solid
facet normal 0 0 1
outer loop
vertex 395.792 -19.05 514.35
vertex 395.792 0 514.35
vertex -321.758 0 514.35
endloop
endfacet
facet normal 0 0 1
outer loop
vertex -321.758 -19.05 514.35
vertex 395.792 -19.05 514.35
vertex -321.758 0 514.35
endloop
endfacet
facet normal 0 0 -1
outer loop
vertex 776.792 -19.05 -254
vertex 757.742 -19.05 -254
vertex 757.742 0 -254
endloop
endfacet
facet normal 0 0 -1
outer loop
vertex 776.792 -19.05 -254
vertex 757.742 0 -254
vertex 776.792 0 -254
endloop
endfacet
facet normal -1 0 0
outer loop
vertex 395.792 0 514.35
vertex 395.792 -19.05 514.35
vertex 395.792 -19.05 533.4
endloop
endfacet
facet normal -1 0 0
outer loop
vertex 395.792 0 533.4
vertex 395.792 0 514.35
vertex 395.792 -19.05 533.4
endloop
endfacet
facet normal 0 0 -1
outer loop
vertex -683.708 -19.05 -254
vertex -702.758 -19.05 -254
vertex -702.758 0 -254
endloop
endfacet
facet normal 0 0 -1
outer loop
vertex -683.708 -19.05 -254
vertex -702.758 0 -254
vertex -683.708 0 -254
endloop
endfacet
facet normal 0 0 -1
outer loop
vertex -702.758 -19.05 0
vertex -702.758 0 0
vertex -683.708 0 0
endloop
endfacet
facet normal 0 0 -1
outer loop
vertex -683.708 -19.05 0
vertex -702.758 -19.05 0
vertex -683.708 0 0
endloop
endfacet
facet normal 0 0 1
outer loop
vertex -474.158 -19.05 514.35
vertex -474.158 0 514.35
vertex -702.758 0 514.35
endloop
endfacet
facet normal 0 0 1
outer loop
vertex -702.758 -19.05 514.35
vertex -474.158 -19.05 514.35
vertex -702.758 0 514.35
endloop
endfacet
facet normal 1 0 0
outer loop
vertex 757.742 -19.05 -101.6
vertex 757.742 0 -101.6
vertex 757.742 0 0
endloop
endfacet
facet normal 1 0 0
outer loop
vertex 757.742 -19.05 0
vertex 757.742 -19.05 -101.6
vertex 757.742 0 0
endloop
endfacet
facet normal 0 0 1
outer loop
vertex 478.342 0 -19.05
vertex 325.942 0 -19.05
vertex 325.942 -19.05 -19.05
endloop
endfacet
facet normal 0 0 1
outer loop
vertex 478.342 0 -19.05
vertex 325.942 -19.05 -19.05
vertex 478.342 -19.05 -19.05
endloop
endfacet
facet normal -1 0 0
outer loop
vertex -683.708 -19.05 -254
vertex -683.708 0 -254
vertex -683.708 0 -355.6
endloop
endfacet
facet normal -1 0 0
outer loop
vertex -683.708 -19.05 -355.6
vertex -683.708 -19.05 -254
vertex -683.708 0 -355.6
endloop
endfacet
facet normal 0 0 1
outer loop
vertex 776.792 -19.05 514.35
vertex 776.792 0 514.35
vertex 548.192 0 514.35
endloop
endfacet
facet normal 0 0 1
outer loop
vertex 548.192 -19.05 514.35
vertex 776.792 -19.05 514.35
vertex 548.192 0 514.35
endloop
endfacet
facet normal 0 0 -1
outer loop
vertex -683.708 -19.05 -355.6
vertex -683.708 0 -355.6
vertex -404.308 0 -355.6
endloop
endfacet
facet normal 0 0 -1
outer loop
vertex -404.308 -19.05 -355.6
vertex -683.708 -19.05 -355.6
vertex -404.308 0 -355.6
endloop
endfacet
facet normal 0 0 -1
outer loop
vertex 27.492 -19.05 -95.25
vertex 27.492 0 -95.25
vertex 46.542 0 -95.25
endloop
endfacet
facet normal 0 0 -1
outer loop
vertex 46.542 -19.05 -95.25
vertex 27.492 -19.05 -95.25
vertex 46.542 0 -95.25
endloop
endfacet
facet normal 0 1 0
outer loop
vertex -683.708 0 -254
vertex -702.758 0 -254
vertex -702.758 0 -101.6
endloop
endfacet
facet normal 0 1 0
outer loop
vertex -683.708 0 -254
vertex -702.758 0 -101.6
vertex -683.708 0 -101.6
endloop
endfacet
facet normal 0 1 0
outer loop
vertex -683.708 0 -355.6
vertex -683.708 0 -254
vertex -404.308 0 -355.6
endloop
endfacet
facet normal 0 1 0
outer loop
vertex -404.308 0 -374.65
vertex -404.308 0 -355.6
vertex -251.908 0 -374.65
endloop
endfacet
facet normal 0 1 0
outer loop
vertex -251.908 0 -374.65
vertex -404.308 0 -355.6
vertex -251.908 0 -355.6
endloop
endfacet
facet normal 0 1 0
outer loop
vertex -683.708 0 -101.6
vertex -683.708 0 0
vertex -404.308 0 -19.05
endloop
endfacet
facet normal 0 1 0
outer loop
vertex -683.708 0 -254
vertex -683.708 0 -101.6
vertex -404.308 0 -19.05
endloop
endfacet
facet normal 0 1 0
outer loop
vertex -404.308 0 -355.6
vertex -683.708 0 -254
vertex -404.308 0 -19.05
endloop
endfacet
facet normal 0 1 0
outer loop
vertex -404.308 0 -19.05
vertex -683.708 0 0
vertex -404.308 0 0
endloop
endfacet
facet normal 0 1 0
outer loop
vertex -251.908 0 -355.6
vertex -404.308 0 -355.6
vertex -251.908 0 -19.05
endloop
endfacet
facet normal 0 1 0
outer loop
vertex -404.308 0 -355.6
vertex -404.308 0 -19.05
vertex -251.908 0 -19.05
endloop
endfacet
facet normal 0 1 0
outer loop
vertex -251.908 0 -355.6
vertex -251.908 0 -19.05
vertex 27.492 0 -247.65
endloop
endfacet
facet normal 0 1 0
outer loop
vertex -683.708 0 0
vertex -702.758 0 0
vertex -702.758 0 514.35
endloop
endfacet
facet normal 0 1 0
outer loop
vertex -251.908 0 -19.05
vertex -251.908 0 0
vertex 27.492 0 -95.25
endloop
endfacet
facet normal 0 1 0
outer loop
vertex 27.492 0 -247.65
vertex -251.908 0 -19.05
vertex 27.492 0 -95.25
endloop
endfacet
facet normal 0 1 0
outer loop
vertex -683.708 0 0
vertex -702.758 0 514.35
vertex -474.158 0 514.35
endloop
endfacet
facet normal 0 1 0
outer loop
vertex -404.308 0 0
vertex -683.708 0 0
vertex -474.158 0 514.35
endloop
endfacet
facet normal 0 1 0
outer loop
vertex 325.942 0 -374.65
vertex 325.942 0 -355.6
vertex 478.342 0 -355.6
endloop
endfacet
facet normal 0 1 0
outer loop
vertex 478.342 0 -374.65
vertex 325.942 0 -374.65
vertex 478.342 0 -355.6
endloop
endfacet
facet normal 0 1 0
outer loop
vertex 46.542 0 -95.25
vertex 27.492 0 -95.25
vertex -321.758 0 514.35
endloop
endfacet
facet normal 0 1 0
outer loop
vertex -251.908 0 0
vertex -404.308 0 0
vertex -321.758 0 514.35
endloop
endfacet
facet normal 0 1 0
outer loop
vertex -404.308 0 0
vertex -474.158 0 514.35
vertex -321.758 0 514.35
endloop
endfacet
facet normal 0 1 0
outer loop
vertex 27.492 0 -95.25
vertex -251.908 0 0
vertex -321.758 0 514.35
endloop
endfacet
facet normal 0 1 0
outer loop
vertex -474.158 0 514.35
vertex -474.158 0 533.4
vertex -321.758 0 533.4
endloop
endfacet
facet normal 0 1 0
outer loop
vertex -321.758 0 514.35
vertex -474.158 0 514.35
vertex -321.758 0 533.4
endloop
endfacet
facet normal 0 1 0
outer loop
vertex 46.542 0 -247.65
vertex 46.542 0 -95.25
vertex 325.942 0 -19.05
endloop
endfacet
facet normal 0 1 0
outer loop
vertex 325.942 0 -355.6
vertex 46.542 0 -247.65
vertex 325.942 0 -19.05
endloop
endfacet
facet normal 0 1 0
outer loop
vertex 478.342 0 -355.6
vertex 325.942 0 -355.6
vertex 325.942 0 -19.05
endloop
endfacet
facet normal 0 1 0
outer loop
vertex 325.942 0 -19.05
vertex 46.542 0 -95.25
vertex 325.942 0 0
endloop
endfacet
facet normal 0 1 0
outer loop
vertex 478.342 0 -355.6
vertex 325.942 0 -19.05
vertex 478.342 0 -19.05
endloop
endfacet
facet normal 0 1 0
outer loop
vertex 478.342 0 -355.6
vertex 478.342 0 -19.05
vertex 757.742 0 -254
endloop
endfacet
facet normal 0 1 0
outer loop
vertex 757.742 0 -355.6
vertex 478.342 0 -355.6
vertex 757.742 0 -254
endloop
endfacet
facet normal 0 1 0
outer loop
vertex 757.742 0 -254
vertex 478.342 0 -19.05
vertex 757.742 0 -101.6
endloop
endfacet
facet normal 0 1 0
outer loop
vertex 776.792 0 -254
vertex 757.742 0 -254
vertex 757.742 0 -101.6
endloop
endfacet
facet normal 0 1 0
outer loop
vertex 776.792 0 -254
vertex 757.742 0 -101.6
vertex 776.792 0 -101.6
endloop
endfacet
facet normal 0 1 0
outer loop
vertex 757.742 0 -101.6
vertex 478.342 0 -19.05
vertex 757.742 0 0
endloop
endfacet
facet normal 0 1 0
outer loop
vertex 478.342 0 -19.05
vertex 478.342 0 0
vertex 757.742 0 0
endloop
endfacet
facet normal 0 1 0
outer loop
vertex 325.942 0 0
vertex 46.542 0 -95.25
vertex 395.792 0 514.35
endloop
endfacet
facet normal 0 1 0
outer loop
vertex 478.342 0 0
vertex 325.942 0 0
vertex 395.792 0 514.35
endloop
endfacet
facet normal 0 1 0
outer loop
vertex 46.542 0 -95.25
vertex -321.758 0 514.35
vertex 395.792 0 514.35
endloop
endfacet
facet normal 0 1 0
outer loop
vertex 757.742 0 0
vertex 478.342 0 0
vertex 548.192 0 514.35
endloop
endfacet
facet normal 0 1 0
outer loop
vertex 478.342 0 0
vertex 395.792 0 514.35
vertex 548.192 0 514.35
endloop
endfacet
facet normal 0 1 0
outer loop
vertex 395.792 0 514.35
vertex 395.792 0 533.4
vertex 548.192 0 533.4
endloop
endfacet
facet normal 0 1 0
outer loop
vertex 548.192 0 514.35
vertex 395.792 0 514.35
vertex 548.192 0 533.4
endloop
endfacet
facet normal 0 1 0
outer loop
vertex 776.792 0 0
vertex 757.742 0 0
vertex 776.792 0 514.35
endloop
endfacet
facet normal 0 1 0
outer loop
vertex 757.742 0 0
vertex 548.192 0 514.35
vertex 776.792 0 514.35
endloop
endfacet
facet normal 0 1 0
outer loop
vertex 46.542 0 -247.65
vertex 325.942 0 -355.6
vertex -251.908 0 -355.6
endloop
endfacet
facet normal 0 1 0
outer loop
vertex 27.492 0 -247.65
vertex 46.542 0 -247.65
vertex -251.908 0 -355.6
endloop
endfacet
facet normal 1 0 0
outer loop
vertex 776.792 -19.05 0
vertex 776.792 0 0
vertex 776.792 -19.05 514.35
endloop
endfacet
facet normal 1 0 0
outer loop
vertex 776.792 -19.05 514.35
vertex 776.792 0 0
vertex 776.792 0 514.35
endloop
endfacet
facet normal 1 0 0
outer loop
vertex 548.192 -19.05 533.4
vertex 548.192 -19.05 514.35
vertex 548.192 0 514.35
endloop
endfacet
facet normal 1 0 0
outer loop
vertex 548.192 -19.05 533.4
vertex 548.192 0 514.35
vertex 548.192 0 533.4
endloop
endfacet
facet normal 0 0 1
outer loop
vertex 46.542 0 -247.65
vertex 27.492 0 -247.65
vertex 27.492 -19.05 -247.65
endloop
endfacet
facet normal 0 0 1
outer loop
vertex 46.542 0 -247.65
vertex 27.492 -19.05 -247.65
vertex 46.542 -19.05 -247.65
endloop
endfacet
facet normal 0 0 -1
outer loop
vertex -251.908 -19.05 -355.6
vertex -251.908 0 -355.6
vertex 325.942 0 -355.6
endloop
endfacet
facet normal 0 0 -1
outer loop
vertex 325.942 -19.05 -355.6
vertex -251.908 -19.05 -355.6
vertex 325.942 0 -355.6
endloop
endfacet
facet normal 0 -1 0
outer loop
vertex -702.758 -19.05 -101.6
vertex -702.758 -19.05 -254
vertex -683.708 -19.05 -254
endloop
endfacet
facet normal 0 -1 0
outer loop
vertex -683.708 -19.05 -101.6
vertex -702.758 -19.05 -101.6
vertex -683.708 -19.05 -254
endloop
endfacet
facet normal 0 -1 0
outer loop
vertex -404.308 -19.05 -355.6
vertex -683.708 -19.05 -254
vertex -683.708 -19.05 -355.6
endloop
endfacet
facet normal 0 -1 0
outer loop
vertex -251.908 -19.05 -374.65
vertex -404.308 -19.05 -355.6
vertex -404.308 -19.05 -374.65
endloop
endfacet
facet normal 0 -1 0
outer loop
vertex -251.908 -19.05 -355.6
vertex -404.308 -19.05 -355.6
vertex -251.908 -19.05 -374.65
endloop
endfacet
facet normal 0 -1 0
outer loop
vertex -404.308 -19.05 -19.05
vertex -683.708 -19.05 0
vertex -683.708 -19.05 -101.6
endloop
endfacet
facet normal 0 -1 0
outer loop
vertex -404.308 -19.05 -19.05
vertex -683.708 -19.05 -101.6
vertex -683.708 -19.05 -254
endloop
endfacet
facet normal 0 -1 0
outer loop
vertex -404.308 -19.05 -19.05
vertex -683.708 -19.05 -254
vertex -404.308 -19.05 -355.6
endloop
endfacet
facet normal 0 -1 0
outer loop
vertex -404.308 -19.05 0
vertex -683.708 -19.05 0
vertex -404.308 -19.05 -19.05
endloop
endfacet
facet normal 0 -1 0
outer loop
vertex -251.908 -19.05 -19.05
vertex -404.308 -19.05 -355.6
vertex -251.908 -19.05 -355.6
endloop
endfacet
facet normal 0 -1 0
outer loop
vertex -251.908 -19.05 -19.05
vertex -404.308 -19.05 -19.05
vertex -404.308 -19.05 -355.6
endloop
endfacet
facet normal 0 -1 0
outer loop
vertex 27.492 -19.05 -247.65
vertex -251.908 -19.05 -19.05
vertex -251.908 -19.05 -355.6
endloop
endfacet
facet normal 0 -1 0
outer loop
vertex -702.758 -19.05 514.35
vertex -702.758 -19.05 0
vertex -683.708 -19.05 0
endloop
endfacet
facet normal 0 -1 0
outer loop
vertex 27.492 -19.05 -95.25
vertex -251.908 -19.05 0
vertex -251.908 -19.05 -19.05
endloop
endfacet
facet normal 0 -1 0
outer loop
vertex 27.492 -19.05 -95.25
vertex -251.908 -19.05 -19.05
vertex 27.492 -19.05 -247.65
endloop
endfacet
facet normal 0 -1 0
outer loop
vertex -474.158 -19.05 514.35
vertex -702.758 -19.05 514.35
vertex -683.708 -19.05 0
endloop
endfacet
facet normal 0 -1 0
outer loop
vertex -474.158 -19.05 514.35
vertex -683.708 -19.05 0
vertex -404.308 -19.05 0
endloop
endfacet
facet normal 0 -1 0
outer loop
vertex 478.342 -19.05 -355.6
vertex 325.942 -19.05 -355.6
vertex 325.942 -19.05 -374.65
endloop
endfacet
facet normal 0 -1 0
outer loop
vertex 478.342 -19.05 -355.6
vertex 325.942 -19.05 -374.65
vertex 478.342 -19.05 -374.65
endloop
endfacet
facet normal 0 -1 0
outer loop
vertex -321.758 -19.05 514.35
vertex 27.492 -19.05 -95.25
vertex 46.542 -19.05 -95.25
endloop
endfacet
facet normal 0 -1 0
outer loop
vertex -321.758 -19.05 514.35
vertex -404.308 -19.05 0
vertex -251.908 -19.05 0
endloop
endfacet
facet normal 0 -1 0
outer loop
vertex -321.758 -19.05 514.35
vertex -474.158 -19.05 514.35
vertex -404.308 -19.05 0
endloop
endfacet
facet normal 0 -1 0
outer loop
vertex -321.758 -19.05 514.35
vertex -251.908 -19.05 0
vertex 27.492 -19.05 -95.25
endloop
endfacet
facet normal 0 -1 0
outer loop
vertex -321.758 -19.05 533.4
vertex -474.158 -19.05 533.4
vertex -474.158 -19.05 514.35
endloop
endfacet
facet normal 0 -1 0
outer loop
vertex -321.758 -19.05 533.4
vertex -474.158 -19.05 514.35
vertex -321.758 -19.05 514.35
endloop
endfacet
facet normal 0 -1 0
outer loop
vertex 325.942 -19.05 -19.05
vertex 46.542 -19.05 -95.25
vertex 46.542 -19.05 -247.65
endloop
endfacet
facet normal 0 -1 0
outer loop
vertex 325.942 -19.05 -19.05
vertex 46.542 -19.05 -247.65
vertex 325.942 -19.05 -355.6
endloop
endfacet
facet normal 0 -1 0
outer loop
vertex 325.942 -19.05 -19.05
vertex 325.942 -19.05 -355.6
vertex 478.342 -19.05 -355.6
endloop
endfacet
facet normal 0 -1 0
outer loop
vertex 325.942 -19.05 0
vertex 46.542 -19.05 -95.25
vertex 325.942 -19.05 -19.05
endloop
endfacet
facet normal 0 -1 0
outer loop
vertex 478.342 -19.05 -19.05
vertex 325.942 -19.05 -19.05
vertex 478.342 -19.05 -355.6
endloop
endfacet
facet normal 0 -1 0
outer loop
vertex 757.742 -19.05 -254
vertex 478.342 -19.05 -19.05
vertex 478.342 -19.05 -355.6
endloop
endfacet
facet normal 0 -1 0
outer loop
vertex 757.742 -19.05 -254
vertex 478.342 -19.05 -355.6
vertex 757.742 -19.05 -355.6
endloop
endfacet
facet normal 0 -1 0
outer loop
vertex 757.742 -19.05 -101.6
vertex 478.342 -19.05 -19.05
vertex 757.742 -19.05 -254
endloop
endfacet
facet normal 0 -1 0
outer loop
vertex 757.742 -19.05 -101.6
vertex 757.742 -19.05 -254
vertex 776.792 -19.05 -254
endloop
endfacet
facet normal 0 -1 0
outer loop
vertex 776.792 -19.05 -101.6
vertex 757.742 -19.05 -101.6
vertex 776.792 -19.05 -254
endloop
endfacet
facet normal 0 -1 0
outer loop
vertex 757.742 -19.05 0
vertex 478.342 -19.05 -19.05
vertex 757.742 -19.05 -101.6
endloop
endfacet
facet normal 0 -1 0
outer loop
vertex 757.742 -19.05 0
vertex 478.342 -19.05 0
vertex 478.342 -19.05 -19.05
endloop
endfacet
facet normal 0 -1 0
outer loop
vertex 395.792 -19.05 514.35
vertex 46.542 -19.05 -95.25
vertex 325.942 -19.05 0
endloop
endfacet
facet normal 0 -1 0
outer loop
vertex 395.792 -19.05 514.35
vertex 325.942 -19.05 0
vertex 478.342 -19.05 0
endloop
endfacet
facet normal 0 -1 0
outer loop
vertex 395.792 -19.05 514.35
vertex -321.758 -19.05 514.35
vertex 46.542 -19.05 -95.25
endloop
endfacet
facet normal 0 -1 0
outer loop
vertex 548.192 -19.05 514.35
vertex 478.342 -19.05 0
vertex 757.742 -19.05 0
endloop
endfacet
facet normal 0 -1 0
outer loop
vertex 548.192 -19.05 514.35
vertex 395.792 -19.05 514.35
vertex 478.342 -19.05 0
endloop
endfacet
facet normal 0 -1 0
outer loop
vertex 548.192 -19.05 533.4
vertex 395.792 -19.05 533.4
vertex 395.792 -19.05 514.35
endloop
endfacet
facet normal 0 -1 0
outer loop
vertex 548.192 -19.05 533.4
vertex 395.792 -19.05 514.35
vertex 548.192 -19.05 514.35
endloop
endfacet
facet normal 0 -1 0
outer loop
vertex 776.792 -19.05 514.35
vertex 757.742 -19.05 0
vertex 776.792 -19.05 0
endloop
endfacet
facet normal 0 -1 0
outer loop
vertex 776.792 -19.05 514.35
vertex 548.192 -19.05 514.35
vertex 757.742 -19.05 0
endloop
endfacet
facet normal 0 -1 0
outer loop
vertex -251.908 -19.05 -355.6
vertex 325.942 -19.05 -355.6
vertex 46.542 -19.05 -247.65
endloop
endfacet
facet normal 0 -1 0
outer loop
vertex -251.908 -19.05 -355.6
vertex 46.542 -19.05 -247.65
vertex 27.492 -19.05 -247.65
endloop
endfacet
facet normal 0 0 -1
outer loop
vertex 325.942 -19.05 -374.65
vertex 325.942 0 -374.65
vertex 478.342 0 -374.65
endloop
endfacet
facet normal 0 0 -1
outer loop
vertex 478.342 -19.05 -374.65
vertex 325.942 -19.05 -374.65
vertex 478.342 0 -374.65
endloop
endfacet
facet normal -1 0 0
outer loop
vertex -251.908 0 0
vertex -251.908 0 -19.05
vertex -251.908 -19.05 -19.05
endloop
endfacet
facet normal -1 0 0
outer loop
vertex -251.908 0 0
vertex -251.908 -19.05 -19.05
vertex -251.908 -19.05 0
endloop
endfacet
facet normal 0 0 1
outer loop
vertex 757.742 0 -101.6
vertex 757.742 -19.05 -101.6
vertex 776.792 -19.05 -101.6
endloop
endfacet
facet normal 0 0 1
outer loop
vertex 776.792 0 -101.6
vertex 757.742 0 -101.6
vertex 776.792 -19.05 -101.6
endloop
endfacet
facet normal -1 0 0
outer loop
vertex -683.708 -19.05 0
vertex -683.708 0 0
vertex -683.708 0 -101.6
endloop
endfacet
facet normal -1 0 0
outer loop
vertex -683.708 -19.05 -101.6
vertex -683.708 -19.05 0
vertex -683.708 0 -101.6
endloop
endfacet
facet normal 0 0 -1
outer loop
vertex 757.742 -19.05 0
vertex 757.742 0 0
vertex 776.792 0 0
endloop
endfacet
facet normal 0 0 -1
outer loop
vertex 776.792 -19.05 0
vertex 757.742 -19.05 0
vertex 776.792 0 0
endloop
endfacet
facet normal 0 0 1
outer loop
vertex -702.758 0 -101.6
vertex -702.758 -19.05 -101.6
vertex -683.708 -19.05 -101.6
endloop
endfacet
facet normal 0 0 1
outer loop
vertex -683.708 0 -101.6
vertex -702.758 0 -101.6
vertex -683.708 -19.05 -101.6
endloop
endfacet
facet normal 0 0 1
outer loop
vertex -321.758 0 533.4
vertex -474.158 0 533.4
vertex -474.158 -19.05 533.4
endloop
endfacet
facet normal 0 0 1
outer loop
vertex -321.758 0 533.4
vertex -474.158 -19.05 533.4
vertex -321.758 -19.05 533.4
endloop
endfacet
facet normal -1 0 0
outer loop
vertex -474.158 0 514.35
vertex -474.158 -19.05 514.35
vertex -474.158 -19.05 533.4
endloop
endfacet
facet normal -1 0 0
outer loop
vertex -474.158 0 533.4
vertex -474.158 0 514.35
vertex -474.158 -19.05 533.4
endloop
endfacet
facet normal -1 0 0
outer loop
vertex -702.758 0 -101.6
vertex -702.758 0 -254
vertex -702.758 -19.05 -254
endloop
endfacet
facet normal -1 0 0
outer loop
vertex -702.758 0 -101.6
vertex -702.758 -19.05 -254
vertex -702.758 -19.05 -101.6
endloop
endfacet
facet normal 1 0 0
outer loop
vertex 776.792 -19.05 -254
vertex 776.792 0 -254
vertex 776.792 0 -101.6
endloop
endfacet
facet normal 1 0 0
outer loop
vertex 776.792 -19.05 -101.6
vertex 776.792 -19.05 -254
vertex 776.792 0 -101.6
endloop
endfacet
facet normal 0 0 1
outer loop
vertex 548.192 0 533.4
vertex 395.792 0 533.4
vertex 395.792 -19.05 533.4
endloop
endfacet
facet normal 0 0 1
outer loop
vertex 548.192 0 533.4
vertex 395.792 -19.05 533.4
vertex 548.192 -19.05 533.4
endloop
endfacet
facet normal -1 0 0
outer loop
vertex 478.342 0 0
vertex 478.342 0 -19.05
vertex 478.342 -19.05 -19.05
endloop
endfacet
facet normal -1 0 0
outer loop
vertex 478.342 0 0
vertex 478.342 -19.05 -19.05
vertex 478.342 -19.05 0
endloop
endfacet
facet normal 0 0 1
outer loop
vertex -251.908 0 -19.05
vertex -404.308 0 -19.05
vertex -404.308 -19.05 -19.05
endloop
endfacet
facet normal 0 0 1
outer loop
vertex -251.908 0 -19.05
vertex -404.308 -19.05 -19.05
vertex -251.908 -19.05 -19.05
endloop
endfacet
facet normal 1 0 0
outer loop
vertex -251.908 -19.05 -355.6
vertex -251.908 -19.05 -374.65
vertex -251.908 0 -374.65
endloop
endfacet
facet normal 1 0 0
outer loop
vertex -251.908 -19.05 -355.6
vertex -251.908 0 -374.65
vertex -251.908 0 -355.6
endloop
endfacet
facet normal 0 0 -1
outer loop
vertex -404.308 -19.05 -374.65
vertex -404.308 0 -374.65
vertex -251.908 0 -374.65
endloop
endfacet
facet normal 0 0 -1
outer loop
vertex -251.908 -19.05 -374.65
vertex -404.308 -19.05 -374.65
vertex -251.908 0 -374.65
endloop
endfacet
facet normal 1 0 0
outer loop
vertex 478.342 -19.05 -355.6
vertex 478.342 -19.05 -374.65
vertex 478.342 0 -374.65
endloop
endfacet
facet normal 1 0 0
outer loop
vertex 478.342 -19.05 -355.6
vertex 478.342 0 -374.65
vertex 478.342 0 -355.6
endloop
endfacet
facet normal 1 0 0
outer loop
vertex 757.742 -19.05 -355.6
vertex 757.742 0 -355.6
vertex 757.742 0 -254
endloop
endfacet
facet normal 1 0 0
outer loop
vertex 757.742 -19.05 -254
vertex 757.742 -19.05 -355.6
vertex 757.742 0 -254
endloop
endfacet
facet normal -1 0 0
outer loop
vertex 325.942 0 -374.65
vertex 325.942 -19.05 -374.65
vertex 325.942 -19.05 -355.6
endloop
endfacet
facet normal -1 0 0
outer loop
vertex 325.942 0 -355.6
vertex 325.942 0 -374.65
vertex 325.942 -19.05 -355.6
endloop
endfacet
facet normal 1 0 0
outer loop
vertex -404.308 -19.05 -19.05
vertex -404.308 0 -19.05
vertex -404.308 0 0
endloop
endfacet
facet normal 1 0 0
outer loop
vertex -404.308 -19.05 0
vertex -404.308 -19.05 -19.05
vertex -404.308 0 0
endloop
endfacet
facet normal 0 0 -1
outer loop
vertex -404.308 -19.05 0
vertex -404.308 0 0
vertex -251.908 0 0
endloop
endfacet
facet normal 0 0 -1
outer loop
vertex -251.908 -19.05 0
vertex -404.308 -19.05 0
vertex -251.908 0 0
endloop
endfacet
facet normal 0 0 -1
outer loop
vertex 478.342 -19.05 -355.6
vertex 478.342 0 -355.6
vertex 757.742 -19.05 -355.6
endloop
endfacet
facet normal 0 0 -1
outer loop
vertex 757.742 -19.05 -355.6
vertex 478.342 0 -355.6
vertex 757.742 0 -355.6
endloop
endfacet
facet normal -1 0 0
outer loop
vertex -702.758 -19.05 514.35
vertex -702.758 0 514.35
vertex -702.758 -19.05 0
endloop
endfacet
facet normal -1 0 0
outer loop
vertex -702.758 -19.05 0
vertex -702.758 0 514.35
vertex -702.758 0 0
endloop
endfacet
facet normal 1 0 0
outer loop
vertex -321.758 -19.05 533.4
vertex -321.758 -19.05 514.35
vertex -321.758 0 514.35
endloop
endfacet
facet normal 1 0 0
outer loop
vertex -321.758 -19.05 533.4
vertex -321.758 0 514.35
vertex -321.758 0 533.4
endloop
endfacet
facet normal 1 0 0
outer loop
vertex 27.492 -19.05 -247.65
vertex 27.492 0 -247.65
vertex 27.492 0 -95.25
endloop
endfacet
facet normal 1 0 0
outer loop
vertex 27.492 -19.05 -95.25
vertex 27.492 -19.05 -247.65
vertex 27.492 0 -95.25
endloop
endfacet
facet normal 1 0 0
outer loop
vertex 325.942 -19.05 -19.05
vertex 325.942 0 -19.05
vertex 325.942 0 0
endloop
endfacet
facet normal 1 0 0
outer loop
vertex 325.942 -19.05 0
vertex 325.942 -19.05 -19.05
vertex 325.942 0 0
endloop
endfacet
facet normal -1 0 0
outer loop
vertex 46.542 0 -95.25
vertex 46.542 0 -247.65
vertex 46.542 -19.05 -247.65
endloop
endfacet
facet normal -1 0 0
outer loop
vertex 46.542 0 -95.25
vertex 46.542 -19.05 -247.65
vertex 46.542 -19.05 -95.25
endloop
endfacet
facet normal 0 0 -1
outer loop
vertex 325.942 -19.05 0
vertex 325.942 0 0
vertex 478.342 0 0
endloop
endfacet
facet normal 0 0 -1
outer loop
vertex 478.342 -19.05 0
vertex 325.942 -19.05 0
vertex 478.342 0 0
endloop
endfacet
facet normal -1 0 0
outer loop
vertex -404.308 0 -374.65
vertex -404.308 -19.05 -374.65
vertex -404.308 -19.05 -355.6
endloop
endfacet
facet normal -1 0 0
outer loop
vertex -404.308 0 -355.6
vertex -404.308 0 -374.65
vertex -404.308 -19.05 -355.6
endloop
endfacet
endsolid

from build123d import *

# Parameters (mm, degrees)
F0_W     = 19.05
F0_H     = 152.4
F0_W_2   = 152.4
F0_H_2   = 19.05
F1_DEPTH = 19.05


with BuildPart() as f1:
    # F0 (on Front) → F1 (new body)
    with BuildSketch(Plane.XZ):
        with Locations((-693.232657, -177.8)):
            Rectangle(F0_W, F0_H)
        with Locations((767.267343, -177.8)):
            Rectangle(F0_W, F0_H)
        with Locations((-328.107657, -365.125)):
            Rectangle(F0_W_2, F0_H_2)
        with Locations((402.142343, -365.125)):
            Rectangle(F0_W_2, F0_H_2)
        Polygon((-683.707657, -254), (-683.707657, -355.6), (-404.307657, -355.6), (-251.907657, -355.6), (325.942343, -355.6), (478.342343, -355.6), (757.742343, -355.6), (757.742343, -254), (757.742343, -101.6), (757.742343, 0), (776.792343, 0), (776.792343, 514.35), (548.192343, 514.35), (395.792343, 514.35), (-321.757657, 514.35), (-474.157657, 514.35), (-702.757657, 514.35), (-702.757657, 0), (-683.707657, 0), (-683.707657, -101.6), align=None)
        with Locations((37.017343, -171.45)):
            Rectangle(F0_W, F0_H, mode=Mode.SUBTRACT)
        with Locations((-328.107657, -9.525)):
            Rectangle(F0_W_2, F0_H_2, mode=Mode.SUBTRACT)
        with Locations((402.142343, -9.525)):
            Rectangle(F0_W_2, F0_H_2, mode=Mode.SUBTRACT)
        with Locations((-397.957657, 523.875)):
            Rectangle(F0_W_2, F0_H_2)
        with Locations((471.992343, 523.875)):
            Rectangle(F0_W_2, F0_H_2)
    extrude(amount=F1_DEPTH)


solid = f1.part
